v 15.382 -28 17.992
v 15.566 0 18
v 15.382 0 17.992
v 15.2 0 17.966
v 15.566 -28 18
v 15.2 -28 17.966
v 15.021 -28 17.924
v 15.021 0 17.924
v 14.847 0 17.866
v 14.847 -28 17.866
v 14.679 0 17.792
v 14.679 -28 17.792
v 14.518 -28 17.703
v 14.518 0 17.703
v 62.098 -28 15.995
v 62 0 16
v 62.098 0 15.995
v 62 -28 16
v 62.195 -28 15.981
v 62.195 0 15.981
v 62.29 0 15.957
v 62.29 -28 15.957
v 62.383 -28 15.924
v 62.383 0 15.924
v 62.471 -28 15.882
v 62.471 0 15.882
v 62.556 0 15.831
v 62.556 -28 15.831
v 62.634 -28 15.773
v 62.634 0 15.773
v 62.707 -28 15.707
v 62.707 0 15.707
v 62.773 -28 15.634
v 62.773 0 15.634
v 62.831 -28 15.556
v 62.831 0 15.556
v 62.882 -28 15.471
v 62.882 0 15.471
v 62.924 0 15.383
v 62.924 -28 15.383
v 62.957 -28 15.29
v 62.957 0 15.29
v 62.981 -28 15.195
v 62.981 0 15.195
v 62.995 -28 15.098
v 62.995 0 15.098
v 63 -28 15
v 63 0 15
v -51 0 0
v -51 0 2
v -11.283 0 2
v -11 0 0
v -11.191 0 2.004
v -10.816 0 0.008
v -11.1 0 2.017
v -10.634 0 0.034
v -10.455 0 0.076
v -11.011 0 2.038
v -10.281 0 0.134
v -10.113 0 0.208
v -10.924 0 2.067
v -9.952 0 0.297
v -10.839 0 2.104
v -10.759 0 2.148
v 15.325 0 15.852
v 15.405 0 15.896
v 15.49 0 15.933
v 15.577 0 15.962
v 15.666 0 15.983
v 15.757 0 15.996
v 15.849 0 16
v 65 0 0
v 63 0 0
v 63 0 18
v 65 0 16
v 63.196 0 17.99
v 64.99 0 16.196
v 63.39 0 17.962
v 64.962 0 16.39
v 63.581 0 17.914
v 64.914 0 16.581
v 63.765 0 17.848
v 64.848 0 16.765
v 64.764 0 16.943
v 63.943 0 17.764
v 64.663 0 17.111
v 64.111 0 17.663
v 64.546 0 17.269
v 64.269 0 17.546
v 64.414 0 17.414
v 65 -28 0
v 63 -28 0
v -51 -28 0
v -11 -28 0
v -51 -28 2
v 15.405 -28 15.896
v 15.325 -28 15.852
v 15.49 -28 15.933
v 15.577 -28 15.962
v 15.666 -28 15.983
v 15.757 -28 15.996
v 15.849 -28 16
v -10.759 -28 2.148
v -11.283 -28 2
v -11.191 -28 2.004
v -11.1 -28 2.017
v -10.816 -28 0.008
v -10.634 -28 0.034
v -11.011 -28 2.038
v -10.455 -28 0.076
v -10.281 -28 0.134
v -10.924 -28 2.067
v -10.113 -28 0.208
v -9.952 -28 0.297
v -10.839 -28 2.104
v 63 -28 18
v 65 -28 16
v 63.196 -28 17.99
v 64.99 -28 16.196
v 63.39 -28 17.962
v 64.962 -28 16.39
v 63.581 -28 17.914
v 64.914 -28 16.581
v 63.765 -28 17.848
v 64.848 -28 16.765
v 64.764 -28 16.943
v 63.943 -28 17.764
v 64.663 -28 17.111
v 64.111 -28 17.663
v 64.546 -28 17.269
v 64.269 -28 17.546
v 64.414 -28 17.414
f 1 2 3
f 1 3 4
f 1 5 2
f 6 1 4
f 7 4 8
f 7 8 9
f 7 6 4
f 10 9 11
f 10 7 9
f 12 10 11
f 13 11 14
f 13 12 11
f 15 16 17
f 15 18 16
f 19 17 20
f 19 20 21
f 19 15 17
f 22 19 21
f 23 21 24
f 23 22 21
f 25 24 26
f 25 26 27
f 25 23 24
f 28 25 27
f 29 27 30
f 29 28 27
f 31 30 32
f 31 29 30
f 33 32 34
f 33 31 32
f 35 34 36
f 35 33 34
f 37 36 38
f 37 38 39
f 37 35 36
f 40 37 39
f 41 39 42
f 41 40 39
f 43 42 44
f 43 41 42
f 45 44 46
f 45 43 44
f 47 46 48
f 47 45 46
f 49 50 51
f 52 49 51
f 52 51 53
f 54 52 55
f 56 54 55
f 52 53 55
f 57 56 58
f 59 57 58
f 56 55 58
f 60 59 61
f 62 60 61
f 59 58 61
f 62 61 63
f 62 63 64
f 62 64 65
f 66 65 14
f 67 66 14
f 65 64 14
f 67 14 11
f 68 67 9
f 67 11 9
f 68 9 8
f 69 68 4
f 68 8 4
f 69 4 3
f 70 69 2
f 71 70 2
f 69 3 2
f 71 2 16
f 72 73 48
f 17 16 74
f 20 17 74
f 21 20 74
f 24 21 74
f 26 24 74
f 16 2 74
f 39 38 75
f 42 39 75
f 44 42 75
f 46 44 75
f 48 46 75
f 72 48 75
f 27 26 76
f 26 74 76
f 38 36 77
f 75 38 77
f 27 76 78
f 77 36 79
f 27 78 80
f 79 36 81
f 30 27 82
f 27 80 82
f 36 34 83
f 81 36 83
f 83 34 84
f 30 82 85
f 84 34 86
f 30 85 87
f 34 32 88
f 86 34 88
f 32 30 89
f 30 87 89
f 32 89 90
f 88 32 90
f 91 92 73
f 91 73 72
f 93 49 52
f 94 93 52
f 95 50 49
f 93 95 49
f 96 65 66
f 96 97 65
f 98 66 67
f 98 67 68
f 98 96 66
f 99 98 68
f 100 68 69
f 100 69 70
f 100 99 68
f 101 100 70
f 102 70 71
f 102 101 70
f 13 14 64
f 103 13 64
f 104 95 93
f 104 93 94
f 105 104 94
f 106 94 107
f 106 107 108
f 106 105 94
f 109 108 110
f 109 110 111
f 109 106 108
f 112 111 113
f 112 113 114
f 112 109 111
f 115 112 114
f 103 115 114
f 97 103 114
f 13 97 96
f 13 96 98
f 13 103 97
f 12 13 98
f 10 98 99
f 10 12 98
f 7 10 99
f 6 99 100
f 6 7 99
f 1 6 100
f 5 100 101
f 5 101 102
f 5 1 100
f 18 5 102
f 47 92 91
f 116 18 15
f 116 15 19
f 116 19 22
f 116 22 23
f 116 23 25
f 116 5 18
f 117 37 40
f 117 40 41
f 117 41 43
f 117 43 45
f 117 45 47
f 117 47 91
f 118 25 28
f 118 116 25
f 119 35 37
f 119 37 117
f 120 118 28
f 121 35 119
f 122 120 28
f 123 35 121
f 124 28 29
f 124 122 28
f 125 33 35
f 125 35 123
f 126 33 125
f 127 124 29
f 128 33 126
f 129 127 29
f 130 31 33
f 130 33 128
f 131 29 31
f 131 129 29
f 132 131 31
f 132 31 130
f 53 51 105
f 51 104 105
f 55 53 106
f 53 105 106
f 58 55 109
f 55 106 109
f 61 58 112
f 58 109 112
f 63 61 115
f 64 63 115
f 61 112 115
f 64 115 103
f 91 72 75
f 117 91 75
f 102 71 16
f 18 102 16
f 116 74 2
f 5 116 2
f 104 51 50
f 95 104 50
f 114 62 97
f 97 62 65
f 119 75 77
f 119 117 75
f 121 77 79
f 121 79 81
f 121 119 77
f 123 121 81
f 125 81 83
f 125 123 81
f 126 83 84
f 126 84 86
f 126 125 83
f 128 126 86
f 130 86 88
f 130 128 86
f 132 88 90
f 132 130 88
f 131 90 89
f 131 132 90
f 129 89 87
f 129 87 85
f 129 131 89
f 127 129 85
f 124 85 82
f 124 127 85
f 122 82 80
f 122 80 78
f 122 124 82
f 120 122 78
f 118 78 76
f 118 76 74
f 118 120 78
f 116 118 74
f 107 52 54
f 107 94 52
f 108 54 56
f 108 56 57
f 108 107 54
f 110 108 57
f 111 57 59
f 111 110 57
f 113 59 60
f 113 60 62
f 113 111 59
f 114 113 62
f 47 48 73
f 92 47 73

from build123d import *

# Parameters (mm, degrees)
F1_DEPTH = 28
F2_R     = 2
F3_R     = 1


with BuildPart() as f1:
    # F0 (on Front) → F1 (new body)
    with BuildSketch(Plane.XZ):
        Polygon((-51.000001, 2), (-51.000001, 0), (-10.433916, 0), (15.566084, 16), (62.999999, 16), (62.999999, 0), (64.999999, 0), (64.999999, 18), (14.999999, 18), (-11.000001, 2), align=None)
    extrude(amount=F1_DEPTH)

    # F2
    f2_edges = [f1.edges().sort_by_distance(p)[0] for p in [
        (14.999999, -14, 18),
        (64.999999, -14, 18),
        (-10.433916, -14, 0),
    ]]
    fillet(f2_edges, radius=F2_R)

    # F3
    f3_edges = [f1.edges().sort_by_distance(p)[0] for p in [
        (-11.000001, -14, 2),
        (62.999999, -14, 16),
        (15.566084, -14, 16),
    ]]
    fillet(f3_edges, radius=F3_R)


solid = f1.part
